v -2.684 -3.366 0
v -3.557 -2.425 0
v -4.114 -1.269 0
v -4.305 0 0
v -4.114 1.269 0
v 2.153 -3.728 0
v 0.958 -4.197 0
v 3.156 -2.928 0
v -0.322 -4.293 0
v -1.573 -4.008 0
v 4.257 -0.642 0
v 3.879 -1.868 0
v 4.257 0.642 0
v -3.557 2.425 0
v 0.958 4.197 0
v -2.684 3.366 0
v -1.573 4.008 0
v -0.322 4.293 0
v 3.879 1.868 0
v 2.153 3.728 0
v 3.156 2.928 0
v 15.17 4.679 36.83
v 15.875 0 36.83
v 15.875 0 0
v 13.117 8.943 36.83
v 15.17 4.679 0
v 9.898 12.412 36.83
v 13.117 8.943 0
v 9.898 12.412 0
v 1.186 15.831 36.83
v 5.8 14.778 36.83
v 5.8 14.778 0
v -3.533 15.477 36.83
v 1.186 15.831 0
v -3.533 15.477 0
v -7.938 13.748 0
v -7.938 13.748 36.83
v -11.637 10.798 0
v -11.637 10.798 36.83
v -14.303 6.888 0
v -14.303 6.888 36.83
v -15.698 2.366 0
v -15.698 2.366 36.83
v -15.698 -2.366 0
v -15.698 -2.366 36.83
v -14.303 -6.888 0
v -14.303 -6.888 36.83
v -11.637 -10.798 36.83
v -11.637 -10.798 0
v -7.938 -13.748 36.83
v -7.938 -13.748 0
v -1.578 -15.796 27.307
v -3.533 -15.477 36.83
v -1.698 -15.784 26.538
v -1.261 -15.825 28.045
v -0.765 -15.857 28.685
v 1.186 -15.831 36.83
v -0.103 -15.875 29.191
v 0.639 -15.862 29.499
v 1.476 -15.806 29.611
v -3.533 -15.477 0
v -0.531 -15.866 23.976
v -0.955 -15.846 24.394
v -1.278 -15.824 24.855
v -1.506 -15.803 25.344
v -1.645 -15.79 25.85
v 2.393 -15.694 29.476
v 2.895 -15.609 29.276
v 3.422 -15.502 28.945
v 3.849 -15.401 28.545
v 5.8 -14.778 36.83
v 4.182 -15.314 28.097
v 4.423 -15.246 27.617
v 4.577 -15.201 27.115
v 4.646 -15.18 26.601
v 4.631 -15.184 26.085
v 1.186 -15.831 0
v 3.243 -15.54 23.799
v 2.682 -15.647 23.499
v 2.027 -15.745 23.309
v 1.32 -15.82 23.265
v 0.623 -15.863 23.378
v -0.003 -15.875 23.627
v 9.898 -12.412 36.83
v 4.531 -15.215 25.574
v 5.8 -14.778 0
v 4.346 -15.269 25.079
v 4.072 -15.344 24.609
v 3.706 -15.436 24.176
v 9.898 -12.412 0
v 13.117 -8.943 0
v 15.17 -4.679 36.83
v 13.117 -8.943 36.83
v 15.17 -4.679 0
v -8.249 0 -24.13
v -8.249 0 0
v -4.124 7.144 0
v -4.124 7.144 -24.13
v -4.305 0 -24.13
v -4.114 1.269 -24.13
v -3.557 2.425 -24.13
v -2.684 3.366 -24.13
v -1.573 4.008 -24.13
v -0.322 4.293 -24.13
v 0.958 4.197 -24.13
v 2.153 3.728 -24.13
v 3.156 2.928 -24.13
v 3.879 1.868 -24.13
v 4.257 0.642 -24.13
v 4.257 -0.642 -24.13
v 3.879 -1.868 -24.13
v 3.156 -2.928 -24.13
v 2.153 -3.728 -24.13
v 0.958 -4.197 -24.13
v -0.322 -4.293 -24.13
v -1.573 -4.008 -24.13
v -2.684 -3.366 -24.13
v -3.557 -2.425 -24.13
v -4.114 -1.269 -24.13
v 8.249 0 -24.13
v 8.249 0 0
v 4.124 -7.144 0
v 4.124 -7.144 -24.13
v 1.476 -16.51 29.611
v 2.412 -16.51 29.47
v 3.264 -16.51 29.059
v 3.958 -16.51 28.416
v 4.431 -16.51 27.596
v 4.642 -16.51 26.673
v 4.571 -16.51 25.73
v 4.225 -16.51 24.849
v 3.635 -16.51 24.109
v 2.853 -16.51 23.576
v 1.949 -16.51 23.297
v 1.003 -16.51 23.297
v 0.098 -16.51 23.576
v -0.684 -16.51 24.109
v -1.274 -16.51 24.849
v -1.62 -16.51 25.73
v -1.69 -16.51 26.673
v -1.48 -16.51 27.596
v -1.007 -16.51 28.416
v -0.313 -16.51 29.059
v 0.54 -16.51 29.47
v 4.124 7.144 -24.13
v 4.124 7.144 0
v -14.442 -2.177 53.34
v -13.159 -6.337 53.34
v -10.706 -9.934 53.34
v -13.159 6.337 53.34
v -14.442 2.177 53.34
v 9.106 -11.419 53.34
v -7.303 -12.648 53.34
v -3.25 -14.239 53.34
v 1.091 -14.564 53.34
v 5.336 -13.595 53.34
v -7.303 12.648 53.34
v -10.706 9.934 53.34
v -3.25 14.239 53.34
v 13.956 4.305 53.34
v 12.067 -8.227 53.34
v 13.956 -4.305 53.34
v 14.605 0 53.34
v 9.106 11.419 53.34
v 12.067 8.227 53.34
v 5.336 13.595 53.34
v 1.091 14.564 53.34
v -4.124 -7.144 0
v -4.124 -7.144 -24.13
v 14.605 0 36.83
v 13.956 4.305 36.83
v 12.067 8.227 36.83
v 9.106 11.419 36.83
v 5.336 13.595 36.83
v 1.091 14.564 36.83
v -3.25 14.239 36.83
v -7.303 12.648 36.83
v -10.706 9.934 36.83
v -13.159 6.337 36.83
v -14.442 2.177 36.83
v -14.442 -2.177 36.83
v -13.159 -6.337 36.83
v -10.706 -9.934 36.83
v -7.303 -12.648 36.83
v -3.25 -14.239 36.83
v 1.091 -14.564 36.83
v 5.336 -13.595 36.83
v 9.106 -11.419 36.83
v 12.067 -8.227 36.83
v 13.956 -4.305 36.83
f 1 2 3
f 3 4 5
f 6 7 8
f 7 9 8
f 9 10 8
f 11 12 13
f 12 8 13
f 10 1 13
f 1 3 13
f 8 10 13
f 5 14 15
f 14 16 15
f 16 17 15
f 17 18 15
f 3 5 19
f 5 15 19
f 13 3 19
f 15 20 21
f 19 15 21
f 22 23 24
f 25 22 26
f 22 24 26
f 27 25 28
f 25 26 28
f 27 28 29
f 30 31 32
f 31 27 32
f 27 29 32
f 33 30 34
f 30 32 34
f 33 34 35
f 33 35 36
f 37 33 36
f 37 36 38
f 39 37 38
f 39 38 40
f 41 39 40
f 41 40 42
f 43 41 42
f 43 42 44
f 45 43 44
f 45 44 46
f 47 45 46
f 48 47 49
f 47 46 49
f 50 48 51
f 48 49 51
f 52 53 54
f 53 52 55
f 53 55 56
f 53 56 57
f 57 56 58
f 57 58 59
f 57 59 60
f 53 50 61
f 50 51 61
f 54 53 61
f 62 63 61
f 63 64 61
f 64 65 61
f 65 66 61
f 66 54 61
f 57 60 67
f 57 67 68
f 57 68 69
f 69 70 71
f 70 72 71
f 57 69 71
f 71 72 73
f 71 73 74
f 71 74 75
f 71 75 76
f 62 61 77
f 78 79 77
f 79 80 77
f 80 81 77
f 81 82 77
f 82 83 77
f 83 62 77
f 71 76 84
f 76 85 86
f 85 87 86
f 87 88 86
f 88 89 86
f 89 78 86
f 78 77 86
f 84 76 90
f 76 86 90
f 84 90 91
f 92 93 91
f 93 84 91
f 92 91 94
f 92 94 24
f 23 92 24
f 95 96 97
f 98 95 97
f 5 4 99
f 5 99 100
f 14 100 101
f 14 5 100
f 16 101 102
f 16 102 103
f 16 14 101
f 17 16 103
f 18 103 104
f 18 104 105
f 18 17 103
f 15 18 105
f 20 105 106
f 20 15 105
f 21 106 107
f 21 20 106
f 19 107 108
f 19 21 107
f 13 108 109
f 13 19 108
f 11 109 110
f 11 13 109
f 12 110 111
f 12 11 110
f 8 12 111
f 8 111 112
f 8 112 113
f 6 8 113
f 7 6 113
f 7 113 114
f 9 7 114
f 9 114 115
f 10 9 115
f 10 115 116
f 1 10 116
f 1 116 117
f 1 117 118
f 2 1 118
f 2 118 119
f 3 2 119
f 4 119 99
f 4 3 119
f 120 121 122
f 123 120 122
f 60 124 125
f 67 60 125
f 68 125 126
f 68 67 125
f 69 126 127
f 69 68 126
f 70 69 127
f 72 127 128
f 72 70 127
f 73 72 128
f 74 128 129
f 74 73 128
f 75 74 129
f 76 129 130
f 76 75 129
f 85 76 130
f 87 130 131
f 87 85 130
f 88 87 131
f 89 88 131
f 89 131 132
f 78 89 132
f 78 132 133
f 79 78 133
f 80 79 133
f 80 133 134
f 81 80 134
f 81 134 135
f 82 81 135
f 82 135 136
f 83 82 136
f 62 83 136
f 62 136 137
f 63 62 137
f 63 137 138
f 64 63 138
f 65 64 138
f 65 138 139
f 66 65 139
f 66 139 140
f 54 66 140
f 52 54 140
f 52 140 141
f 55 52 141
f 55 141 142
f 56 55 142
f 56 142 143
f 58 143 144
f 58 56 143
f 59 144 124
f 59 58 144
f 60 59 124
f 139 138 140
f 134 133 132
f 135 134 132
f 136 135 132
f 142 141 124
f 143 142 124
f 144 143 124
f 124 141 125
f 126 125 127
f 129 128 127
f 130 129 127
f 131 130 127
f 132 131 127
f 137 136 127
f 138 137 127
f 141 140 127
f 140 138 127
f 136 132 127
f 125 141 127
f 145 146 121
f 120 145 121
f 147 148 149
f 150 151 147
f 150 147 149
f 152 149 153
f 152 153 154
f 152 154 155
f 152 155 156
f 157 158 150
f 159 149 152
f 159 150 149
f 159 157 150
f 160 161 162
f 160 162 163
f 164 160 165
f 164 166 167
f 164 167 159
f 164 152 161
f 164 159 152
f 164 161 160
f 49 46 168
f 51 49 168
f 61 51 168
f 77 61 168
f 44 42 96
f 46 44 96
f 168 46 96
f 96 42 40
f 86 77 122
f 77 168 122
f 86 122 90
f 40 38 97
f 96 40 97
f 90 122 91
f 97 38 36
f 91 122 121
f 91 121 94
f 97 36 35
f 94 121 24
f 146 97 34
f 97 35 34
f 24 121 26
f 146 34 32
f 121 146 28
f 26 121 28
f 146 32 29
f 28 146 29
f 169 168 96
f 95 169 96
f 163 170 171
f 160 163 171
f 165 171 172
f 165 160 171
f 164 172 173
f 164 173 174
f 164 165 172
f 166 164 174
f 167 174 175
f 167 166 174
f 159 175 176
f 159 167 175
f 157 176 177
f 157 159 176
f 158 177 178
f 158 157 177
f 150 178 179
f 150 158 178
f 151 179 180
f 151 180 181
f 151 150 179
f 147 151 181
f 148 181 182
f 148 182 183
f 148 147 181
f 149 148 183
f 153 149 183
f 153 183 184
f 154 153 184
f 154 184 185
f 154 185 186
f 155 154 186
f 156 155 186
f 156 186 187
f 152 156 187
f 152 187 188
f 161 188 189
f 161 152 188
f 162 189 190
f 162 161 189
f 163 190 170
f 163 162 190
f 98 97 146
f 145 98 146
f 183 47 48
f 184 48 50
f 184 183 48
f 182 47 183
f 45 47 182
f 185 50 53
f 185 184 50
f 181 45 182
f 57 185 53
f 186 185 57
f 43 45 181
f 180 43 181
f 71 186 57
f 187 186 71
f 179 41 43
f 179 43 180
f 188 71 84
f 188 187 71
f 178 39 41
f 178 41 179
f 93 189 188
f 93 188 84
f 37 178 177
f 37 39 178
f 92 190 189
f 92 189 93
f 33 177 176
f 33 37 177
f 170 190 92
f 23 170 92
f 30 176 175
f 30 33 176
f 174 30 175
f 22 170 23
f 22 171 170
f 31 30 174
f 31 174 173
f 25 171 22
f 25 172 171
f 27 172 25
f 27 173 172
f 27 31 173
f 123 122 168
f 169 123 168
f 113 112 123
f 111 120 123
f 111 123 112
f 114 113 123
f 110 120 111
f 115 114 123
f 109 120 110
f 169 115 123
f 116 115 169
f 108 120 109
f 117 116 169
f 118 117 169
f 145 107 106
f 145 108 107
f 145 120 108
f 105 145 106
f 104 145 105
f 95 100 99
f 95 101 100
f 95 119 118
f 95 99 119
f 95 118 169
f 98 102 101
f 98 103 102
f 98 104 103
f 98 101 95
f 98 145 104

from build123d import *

# Parameters (mm, degrees)
SKETCH2_R           = 15.875
BOSS_EXTRUDE1_DEPTH = 53.34
SKETCH3_R           = 4.3053
BOSS_EXTRUDE2_DEPTH = 24.13
SKETCH4_R           = 3.175
BOSS_EXTRUDE3_DEPTH = 16.51
SKETCH5_OUTSIDE_W   = 51.704
SKETCH5_OUTSIDE_H   = 52.339
SKETCH5_OUTSIDE_R   = 14.605
CUT_EXTRUDE1_DEPTH  = 16.51


with BuildPart() as part:
    # Sketch2 → Boss-Extrude1 (new body)
    with BuildSketch(Plane.XY):
        Circle(SKETCH2_R)
    extrude(amount=BOSS_EXTRUDE1_DEPTH)

    # Sketch3 → Boss-Extrude2 (add)
    with BuildSketch(Plane(origin=(0, 0, 0), x_dir=(-1, 0, 0), z_dir=(0, 0, -1))):
        Polygon((8.248891971, 0), (4.124445986, 7.14375), (-4.124445986, 7.14375), (-8.248891971, 0), (-4.124445986, -7.14375), (4.124445986, -7.14375), align=None)
        Circle(SKETCH3_R, mode=Mode.SUBTRACT)
    extrude(amount=BOSS_EXTRUDE2_DEPTH)

    # Sketch4 → Boss-Extrude3 (add)
    with BuildSketch(Plane(origin=(0, 0, 0), x_dir=(1, 0, 0), z_dir=(0, 1, 0))):
        with Locations(Location((1.475733324, -26.436178991, 0), (0, 0, 270))):
            Circle(SKETCH4_R)
    extrude(amount=-BOSS_EXTRUDE3_DEPTH)

    # Sketch5 outside → Cut-Extrude1 (cut)
    with BuildSketch(Plane.XY.offset(53.34)):
        with Locations((0, -0.3175)):
            Rectangle(SKETCH5_OUTSIDE_W, SKETCH5_OUTSIDE_H)
        Circle(SKETCH5_OUTSIDE_R, mode=Mode.SUBTRACT)
    extrude(amount=-CUT_EXTRUDE1_DEPTH, mode=Mode.SUBTRACT)


solid = part.part
